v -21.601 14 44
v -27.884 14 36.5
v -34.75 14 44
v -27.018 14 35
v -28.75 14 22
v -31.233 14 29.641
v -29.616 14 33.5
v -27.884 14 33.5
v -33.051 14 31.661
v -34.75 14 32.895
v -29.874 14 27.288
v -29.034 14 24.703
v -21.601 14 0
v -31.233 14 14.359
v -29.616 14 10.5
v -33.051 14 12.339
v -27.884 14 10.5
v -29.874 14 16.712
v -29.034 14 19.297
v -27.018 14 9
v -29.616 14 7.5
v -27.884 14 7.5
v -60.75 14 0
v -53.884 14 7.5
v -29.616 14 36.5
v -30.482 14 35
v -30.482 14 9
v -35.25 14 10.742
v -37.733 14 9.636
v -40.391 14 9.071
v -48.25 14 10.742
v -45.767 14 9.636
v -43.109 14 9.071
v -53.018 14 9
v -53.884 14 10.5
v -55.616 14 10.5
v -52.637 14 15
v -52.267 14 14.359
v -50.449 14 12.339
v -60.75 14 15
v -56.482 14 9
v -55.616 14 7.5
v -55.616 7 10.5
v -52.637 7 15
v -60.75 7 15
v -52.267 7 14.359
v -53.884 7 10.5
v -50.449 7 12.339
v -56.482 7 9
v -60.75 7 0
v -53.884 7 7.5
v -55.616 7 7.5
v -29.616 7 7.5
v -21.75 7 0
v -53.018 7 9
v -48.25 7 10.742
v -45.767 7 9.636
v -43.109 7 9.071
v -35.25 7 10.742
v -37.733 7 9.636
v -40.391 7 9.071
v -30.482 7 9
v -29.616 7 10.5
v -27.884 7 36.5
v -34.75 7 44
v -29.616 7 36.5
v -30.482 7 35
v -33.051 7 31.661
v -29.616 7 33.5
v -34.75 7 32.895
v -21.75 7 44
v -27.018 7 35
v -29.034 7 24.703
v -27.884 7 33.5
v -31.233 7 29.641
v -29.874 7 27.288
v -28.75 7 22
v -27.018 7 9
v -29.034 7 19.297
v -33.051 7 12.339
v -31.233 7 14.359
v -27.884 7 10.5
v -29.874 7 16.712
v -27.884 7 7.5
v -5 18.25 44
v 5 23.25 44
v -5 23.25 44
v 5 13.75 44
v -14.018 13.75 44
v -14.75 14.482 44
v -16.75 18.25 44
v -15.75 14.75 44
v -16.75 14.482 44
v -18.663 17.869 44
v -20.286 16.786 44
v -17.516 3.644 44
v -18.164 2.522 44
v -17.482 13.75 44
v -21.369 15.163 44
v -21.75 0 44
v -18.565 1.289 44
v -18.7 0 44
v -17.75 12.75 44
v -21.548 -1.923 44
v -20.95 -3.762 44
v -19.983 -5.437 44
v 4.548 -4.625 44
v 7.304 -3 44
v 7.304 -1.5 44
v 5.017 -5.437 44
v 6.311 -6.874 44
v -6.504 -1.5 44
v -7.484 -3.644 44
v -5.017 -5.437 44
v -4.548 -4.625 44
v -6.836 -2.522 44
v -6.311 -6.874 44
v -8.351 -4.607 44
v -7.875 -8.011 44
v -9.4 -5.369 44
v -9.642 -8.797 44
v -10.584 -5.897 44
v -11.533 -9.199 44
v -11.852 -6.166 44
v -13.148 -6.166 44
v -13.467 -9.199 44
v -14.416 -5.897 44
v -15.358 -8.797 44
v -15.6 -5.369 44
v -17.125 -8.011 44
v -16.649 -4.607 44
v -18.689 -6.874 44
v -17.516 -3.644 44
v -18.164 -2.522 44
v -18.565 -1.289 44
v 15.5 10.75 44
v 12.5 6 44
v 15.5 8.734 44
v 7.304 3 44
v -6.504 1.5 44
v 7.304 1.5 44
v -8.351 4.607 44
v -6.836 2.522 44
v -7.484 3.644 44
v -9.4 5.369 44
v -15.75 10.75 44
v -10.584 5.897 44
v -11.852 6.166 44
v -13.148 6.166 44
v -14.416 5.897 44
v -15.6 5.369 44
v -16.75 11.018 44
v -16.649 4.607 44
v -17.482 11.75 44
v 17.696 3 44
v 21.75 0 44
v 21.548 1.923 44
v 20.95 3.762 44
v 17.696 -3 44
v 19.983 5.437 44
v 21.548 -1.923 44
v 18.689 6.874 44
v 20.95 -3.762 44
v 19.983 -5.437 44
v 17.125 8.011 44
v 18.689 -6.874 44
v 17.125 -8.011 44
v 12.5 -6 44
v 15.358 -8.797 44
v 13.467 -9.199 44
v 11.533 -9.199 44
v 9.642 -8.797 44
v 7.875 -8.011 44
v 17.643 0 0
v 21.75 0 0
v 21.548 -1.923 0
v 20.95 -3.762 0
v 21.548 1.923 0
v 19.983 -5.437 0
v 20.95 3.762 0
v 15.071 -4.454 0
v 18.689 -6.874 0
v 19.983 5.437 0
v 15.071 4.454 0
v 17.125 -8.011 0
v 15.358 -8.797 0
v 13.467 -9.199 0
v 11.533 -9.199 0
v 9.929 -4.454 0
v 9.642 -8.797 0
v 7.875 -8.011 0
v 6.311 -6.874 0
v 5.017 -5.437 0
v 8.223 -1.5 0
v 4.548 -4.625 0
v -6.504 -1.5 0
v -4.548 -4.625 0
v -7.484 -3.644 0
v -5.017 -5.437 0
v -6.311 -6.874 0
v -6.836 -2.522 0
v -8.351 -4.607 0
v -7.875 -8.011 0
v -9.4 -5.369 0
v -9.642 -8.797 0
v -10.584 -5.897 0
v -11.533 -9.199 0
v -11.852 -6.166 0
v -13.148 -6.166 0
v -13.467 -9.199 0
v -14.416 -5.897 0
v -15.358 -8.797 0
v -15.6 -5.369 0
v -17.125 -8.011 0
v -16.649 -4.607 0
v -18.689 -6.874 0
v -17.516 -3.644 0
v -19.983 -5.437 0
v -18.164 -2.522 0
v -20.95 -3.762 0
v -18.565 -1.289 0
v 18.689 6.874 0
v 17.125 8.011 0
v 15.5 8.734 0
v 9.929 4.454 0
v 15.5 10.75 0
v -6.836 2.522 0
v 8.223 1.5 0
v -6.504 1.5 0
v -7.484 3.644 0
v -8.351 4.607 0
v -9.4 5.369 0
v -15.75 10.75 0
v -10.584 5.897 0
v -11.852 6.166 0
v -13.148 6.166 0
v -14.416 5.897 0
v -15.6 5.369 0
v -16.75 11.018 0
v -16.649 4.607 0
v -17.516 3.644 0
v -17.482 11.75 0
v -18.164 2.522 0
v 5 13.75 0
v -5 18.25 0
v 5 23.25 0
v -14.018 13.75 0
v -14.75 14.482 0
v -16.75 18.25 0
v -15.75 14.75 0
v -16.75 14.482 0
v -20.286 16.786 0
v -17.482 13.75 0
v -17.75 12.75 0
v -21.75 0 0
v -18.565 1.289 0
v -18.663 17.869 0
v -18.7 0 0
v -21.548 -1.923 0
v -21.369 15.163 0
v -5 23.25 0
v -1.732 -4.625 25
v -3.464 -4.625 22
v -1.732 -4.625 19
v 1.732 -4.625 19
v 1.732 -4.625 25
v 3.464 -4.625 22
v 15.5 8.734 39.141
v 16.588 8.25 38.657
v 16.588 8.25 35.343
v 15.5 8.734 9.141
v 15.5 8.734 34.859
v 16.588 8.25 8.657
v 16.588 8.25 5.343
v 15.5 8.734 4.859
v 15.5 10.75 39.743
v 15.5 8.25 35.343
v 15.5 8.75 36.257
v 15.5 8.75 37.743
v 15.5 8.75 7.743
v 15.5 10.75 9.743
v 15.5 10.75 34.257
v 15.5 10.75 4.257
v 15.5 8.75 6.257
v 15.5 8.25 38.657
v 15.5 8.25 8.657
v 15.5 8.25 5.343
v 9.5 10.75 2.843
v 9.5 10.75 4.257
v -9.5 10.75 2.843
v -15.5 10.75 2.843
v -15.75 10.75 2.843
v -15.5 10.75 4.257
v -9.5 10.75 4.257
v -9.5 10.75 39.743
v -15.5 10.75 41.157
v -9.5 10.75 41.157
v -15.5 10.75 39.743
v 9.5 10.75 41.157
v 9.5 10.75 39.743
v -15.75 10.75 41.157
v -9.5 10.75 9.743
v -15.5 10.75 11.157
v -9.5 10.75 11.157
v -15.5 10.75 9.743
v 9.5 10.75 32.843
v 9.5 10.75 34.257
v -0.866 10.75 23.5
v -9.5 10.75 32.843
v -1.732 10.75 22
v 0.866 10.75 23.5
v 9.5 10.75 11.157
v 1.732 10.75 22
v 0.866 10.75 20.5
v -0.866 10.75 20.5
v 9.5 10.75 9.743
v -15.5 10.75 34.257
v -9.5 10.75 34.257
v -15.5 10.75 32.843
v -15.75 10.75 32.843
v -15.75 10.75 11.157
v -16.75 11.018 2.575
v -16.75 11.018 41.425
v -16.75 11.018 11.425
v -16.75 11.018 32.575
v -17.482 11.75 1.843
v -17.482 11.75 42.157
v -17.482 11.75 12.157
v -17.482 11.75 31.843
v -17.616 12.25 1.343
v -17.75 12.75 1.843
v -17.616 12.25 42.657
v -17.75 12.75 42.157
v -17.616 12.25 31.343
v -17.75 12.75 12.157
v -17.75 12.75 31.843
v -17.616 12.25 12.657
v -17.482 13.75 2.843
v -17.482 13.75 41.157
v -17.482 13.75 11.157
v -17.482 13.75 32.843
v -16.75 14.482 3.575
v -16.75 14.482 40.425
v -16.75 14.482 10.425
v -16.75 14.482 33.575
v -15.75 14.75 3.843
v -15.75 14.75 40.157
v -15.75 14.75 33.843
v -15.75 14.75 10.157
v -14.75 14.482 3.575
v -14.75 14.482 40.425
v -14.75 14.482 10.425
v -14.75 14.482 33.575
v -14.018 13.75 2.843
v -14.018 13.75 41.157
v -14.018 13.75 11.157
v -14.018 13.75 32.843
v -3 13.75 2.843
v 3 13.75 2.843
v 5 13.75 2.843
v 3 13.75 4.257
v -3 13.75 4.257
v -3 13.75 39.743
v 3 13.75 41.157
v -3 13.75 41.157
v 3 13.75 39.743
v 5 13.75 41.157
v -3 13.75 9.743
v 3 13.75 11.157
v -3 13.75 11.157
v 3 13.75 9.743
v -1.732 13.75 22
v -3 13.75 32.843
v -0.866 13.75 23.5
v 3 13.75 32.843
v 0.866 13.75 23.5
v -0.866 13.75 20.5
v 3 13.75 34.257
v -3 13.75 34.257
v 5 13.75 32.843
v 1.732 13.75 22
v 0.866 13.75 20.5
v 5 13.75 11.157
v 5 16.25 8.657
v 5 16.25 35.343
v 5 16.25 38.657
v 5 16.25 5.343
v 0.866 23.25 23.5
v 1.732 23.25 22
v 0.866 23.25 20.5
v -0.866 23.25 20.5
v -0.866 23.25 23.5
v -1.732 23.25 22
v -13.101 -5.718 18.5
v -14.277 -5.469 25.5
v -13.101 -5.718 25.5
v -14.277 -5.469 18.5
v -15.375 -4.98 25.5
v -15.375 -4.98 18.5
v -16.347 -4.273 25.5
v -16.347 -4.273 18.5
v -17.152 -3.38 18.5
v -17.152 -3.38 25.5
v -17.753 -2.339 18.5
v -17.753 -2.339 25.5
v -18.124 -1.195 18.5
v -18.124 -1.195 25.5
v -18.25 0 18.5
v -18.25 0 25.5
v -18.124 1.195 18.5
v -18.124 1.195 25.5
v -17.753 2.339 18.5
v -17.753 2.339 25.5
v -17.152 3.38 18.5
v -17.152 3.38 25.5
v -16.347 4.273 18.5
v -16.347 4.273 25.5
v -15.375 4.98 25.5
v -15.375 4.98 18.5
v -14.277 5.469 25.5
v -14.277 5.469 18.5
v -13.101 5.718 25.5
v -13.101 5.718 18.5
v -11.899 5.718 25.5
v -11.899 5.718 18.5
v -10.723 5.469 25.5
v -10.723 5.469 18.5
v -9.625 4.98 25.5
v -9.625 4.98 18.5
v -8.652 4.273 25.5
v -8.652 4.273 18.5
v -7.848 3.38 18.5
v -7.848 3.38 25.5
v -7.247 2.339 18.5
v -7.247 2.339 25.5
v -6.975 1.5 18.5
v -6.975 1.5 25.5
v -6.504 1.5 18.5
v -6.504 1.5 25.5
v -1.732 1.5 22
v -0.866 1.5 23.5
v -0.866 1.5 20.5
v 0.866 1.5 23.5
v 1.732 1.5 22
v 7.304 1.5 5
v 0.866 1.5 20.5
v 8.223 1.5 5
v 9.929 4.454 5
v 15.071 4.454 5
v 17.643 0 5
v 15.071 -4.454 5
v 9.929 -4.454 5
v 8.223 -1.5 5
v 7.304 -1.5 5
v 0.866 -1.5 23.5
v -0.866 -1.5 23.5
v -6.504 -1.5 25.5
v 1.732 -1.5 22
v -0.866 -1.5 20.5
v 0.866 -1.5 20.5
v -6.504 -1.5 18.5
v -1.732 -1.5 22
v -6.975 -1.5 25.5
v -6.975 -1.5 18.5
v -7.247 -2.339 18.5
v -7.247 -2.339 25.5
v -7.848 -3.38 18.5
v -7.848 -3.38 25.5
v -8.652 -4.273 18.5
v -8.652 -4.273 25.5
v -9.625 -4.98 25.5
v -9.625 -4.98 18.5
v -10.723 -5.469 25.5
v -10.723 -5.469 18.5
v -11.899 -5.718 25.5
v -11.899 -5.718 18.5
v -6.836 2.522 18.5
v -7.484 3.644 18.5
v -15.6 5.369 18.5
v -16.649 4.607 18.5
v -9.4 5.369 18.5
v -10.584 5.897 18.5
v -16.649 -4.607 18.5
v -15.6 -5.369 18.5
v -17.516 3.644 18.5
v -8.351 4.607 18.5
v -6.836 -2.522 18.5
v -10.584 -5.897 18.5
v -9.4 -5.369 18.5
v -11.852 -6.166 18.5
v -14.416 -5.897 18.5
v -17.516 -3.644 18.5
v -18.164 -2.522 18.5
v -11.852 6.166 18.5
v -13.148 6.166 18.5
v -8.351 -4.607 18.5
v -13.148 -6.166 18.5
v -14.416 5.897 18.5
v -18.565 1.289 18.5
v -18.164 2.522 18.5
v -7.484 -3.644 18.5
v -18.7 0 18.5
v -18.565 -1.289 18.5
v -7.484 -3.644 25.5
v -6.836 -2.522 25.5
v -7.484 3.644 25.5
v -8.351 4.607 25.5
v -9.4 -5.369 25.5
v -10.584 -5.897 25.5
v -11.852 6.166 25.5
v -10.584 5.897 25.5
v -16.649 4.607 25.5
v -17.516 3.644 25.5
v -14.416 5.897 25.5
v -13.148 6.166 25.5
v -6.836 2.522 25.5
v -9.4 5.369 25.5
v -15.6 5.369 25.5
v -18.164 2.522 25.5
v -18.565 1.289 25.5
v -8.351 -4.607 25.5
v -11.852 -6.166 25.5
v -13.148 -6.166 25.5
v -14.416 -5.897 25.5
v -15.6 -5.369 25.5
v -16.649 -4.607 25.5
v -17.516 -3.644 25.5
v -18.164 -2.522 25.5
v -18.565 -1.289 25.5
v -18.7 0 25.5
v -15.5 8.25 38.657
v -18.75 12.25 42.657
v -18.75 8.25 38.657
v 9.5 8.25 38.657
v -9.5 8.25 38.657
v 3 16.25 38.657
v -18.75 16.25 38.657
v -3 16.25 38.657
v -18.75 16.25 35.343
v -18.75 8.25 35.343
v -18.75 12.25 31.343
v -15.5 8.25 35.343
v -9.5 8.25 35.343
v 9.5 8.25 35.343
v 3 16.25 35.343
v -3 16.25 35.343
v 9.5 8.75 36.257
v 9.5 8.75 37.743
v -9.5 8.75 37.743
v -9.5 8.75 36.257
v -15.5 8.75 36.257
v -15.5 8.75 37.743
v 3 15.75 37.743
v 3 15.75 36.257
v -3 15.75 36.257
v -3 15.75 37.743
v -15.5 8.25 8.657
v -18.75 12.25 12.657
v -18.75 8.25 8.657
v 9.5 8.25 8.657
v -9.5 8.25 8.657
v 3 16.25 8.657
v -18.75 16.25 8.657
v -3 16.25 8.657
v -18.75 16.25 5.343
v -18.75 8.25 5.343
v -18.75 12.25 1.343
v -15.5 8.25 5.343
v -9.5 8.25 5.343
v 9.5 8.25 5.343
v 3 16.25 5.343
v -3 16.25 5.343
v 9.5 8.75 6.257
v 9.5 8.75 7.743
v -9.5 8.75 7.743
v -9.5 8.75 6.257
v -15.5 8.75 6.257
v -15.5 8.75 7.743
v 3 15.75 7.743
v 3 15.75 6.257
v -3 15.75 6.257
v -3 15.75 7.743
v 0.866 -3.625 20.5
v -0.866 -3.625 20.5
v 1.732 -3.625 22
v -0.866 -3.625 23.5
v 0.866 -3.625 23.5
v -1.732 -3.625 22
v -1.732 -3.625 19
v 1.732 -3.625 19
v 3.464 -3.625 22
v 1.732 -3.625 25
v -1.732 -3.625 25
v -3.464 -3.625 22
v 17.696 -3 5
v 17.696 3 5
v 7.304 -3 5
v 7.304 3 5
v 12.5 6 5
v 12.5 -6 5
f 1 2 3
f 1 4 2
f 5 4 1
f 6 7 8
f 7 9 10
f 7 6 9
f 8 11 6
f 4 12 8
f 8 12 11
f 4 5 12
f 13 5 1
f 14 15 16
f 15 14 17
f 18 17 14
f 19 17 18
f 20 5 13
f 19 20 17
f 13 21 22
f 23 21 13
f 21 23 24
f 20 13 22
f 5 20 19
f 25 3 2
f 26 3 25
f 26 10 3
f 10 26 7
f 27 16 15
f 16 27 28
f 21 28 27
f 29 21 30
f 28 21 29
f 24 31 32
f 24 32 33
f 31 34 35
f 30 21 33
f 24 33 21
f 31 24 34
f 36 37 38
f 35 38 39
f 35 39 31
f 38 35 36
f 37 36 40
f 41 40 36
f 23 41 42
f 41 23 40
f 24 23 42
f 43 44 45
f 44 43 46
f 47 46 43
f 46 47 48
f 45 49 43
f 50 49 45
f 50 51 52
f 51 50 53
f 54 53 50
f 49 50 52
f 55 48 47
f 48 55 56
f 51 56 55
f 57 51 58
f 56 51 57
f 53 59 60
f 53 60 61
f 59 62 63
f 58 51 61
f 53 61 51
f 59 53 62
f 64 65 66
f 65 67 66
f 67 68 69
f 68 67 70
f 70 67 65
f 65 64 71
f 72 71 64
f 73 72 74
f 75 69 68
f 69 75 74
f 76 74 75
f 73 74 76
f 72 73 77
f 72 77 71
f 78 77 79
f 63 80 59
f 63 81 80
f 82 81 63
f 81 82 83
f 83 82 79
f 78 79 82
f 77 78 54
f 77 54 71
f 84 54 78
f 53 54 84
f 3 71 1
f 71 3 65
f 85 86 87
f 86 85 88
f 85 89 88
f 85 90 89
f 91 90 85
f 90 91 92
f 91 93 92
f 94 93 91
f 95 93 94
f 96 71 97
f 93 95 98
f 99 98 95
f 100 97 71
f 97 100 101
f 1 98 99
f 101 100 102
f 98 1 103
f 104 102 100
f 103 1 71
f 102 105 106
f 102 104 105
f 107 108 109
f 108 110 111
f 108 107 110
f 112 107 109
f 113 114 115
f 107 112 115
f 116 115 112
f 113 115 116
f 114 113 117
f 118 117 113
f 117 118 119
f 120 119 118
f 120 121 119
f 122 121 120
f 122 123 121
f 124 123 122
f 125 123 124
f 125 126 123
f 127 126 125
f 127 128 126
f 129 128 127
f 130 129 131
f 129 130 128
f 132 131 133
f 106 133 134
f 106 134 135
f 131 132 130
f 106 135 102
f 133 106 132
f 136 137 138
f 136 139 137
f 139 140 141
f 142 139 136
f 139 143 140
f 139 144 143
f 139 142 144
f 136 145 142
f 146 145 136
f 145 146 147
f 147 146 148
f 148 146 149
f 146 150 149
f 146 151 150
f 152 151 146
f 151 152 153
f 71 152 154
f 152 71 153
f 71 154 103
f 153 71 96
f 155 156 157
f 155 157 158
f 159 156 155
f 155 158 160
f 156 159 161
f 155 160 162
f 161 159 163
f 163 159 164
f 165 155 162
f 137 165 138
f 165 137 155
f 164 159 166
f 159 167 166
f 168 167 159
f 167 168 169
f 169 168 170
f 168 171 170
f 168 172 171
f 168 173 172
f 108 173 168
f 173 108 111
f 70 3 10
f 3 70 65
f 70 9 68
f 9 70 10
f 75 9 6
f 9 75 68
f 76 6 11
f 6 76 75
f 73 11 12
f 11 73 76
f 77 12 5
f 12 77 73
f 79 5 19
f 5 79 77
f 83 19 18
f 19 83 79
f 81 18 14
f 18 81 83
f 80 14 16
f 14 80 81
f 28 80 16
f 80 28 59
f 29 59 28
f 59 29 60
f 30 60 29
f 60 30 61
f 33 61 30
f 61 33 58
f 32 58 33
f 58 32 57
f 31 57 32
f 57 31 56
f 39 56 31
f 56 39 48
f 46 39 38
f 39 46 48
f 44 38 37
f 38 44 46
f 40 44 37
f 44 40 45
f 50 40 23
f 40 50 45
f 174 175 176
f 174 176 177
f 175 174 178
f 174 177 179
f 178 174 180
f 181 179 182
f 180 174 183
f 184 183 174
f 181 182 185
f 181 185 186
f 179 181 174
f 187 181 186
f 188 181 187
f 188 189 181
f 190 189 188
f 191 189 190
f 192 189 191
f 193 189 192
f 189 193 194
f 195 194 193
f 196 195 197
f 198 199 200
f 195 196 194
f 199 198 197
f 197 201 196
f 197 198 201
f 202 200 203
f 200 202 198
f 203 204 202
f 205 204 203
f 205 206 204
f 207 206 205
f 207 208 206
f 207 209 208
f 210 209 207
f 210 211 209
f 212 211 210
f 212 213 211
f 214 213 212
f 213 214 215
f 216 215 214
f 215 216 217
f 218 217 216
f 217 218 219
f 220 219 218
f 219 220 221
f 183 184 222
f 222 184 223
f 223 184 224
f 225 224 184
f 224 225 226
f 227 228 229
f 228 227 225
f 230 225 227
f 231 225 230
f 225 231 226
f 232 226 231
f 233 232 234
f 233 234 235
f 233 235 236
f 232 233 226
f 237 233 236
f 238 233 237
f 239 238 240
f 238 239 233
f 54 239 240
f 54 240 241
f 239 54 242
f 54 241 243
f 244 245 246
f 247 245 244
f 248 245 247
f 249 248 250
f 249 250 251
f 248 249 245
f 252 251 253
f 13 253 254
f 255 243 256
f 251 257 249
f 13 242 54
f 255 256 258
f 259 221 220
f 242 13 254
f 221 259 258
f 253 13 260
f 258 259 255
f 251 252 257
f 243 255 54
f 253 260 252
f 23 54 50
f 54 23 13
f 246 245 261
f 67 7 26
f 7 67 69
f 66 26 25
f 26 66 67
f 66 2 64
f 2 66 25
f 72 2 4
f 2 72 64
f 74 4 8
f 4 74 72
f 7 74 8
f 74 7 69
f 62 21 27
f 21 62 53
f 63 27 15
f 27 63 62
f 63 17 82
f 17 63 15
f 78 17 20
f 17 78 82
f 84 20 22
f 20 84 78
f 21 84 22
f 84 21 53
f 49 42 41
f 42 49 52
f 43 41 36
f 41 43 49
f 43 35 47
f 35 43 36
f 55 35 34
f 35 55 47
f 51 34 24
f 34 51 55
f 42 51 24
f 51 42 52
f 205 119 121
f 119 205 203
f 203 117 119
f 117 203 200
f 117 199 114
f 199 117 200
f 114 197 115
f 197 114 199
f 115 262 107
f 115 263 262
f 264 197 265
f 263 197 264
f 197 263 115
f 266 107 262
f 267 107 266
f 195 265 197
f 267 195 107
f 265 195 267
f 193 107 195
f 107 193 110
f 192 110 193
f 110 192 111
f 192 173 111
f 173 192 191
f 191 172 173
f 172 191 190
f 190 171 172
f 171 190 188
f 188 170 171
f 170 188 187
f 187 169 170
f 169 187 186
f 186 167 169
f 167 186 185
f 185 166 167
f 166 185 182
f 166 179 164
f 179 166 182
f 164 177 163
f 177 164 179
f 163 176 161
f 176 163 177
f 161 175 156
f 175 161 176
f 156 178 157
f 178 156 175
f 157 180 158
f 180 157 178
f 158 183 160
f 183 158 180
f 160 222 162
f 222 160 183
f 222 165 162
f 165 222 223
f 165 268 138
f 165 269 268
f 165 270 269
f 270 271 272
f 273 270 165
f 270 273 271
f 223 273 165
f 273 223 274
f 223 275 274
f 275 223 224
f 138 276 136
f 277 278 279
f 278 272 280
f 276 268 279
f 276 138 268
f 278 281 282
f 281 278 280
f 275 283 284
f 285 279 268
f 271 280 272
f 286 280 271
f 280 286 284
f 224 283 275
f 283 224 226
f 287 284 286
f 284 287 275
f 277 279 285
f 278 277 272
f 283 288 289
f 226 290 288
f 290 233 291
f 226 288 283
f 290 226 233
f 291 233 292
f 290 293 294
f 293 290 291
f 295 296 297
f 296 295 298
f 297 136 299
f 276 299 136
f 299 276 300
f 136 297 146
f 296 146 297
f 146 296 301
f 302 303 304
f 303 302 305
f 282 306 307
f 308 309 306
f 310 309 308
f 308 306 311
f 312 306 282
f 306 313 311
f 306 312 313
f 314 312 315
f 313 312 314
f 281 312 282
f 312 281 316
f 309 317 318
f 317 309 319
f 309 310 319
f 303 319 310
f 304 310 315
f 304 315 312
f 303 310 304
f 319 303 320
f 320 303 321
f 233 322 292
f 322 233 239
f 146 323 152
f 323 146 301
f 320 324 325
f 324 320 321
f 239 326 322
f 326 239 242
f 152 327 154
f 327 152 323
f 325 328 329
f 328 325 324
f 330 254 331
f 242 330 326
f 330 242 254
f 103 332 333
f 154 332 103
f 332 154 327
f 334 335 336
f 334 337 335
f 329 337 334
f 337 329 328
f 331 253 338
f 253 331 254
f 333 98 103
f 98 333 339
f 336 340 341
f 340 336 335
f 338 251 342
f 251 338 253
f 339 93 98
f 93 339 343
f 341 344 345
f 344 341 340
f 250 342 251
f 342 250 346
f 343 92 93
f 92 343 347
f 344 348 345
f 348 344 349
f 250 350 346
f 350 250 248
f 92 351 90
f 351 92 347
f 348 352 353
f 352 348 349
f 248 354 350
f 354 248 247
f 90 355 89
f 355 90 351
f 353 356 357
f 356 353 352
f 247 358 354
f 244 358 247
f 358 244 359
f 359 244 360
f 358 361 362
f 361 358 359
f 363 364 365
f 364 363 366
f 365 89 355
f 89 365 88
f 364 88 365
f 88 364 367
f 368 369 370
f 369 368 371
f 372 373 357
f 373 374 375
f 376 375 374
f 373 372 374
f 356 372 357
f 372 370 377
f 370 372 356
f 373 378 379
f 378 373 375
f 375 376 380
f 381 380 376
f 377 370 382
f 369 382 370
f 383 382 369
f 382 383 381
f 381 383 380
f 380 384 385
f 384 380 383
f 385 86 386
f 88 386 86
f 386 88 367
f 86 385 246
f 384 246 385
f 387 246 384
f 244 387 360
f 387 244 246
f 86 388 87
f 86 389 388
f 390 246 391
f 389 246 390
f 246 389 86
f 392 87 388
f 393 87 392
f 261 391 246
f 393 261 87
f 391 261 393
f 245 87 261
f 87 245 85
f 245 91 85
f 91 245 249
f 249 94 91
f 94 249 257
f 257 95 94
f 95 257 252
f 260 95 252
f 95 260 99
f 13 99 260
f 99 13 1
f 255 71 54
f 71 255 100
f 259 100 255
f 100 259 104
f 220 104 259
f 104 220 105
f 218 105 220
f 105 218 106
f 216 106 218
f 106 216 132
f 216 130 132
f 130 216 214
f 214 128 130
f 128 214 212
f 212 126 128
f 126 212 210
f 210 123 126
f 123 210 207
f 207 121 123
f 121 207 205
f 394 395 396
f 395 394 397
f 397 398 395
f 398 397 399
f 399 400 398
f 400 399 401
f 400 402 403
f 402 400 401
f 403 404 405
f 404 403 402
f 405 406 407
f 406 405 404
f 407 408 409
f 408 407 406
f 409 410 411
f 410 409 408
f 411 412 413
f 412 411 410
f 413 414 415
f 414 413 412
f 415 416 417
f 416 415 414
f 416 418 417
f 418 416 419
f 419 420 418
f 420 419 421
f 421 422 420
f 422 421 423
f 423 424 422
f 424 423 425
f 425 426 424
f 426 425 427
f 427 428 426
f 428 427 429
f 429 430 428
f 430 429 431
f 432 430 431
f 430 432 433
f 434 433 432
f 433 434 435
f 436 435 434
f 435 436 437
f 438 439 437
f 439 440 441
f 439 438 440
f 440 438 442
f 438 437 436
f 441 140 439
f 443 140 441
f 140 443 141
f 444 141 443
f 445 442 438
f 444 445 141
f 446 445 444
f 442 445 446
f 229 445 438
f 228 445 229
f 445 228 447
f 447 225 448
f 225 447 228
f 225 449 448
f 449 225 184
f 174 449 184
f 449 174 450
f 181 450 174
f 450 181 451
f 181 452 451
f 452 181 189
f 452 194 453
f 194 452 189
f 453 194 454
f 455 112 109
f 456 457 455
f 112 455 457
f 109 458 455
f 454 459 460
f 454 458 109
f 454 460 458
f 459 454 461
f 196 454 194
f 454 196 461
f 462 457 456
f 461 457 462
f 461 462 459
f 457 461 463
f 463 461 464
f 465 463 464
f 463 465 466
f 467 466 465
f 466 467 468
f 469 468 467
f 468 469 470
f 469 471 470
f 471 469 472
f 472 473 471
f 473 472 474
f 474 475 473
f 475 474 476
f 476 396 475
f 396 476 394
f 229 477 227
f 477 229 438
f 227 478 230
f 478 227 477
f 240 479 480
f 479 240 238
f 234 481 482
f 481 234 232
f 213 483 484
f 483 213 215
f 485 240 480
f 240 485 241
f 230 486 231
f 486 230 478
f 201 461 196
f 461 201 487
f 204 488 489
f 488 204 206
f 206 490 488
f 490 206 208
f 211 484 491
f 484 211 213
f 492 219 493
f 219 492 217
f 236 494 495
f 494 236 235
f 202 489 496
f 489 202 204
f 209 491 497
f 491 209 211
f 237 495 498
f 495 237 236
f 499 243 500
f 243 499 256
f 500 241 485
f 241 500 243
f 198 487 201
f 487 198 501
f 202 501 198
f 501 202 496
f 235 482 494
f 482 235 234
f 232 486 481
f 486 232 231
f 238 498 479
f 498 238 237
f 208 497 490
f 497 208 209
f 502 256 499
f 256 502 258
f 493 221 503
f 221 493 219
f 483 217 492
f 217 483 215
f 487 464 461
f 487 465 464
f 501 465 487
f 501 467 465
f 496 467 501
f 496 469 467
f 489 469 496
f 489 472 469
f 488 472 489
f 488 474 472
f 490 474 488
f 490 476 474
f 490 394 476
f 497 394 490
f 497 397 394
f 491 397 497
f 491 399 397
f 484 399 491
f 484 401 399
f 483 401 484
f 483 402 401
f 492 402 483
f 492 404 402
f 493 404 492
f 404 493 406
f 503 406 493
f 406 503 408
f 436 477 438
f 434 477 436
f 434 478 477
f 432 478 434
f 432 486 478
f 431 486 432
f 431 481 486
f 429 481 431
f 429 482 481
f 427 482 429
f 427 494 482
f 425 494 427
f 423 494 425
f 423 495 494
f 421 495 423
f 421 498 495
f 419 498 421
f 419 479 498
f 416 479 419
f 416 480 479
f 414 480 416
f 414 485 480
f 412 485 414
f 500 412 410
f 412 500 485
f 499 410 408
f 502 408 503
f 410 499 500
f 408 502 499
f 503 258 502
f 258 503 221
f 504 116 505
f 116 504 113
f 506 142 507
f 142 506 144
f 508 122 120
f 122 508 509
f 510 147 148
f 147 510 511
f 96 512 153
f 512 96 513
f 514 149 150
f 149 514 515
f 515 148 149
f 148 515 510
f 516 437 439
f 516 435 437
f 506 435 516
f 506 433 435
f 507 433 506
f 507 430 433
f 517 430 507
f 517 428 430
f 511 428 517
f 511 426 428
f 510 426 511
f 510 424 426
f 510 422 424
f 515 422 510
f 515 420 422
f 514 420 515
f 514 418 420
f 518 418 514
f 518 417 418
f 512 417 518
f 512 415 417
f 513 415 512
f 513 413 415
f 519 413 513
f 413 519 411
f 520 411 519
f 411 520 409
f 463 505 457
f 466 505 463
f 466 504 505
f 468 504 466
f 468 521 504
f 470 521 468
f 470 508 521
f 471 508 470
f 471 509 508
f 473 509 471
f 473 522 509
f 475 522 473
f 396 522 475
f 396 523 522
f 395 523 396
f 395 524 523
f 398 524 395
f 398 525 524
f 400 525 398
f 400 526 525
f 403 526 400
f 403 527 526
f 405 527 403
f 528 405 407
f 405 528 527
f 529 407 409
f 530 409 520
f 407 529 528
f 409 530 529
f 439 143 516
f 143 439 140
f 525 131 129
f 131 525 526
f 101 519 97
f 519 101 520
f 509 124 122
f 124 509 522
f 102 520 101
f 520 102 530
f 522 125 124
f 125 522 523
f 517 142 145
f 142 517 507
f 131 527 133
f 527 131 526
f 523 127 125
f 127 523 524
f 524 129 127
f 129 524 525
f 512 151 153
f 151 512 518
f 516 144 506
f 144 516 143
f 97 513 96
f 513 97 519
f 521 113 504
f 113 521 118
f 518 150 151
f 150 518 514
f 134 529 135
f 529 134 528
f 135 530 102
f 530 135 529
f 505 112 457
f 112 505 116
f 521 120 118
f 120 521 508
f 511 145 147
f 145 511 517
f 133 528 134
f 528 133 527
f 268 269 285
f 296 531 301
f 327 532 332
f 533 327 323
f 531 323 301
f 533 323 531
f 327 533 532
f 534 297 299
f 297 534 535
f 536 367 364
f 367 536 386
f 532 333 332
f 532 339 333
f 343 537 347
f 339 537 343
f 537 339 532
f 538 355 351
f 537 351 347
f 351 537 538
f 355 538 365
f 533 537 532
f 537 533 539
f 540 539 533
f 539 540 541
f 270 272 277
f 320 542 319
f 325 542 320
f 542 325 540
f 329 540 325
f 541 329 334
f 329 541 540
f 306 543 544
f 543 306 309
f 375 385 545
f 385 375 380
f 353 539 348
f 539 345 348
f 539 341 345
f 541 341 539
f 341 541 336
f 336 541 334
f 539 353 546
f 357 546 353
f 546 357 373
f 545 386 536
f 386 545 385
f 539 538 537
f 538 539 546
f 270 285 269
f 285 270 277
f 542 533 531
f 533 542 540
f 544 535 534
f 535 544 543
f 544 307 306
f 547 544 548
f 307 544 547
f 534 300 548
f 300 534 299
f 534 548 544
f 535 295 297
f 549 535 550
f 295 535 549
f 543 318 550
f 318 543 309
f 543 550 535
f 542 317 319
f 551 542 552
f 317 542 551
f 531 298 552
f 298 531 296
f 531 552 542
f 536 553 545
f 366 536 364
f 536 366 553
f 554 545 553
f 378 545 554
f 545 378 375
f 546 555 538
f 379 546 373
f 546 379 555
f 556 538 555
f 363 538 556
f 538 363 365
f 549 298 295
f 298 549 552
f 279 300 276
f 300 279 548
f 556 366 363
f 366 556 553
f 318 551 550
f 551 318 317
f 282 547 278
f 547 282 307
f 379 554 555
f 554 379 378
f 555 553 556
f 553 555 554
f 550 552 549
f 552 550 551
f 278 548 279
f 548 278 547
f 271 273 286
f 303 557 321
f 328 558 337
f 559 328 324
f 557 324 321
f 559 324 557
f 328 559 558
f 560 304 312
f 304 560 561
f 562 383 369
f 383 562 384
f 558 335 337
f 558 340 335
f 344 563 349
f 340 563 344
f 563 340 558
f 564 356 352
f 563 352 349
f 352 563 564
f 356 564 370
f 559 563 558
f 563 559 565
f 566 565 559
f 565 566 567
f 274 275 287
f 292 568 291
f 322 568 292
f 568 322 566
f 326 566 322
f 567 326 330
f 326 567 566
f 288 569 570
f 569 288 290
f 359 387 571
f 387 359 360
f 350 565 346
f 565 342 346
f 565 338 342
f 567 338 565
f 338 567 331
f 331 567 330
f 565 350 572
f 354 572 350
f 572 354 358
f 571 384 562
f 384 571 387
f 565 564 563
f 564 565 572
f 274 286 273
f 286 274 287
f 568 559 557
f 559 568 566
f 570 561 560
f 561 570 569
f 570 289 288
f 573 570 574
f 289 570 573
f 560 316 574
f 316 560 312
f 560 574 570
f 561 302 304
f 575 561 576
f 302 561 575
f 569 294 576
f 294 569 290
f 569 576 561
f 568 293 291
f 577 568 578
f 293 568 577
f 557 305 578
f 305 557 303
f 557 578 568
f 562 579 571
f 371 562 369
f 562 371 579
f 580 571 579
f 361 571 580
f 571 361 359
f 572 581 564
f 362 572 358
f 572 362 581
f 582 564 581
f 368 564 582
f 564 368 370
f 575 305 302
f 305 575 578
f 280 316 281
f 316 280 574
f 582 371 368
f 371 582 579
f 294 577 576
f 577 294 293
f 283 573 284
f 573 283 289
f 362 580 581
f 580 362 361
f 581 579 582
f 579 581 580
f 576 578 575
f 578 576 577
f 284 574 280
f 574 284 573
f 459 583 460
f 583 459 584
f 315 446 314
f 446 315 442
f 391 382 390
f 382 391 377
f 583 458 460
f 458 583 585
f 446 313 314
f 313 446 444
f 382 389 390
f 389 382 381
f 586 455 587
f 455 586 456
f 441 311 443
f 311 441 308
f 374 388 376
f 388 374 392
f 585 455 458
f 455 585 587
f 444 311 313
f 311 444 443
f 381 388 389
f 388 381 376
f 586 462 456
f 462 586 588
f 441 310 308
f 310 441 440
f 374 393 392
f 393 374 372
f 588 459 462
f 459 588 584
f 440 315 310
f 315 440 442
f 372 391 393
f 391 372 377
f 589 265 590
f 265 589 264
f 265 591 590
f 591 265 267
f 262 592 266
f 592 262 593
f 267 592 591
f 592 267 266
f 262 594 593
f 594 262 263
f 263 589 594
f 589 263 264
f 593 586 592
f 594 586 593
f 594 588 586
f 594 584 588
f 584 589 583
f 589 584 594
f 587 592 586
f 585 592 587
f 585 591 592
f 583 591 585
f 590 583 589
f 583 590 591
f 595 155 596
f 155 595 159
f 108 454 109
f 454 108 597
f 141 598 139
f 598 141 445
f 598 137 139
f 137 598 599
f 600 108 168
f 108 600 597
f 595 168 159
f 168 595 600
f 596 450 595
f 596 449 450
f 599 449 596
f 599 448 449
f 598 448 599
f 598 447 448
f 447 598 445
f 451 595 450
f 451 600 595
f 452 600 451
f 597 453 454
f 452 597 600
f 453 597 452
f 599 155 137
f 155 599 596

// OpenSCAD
rod_size = 6;
rod_nut_size = 12; //12 for M6, 15 for M8
bearing_size = 12.5; //12.5 for LM6UU, 15.5 for LM8UU,LM8SUU
bearing_length = 19.5; //19.5 for LM6UU, 17.5 for LM8SUU, 24.5 for LM8UU
yz_motor_distance = 25;
motor_screw_spacing = 26; //26 for NEMA14, 31 for NEMA17
motor_casing = 38; //38 for NEMA14, 45 for NEMA17
end_height = 40; //measure the height of your motor casing and add 4mm. Suggestion: 40 for NEMA14, 55 for NEMA17
bed_mount_height = 16;
//x_rod_spacing = motor_screw_spacing + 3 + rod_size;
x_rod_spacing = 30;
x_carriage_width = 35;
carriage_extruder_offset = 5;
pulley_size = 20;
idler_pulley_width = 10;
gusset_size = 15;
m3_size = 3;
m3_nut_size = 6;
m4_size = 4;
motor_shaft_size = 5;
outer_smooth=true;

// ratio for converting diameter to apothem
da6 = 1 / cos(180 / 6) / 2;
da8 = 1 / cos(180 / 8) / 2;

//Comment out all of the lines in the following section to render the assembled machine. Uncomment one of them to export that part for printing. You can also use the individual files to export each part.

//!base_end();
//!for(b = [0:1]) mirror([0, b, 0]) for(a = [-1,1]) translate([a * bearing_size / 4, bearing_size - (bearing_size * 2/3) * a, 0]) rotate(90 + 90 * a) y_bearing_retainer();
//!for(b = [0:1]) mirror([0, b, 0]) for(a = [-1,1]) translate([a * -7.5, 18 - 5 * a, 0]) rotate(180 + 90 * a) bed_mount();

//cylinder(h = 100, r = 3);
x_end(2);
%translate([-12.5,0,0]) cylinder(h=200, r=6.1,center=true, $fn=12);
%translate([12.5,0,0]) cylinder(h=200, r=6.1,center=true, $fn=12);
//!x_end(0);
//!x_carriage();
//!for(side = [-1,1]) translate([0, side * motor_screw_spacing / 2, 0]) leadscrew_coupler();
//!y_idler();
//!for(x = [1, -1]) for(y = [1, -1]) translate([x * (pulley_size / 2 + 3), y * (pulley_size / 2 + 3), 0]) idler_pulley(true);
//!for(x = [1, -1]) for(y = [1, -1]) translate([x * (rod_size * 1.5 + 2), y * (rod_size * 1.5 + 2), 0]) foot();
//!for(side = [0, 1]) mirror([side, 0, 0]) translate([-rod_size * 2.5, 0, 0]) z_top_clamp();


//The following section positions parts for rendering the assembled machine.
/*
	translate([0, 0, -bearing_size]) rotate([0, 180, 0]) base_end();
	for(end = [1, -1]) translate([0, end * motor_screw_spacing / 2 + 5, -bearing_size + bearing_size * sqrt(2) / 4]) rotate([-90, 0, 180]) y_bearing_retainer();
	for(side = [0, 1]) mirror([0, side, 0]) translate([yz_motor_distance / 2 - bearing_size / 2, -motor_casing / 2 - rod_size * 2 - 10, -bearing_size + bearing_size * sqrt(2) / 4]) rotate([90, 0, 0]) bed_mount();
	translate([-yz_motor_distance / 2 + rod_size - motor_casing / 4 - rod_size / 2, 0, 60 + (x_rod_spacing + 8 + rod_size) / 2]) rotate([0, 180, 0]) x_end(0);
	translate([140, 0, 60 + (x_rod_spacing + 8 + rod_size) / 2]) rotate([0, 180, 0]) {
		x_end(2);
		translate([0, 8 + rod_size, 0]) rotate([90, 0, 0]) translate([0, (x_rod_spacing + 8 + rod_size) / 2, rod_size / 2 - 2 - bearing_size / 2 - 4 - idler_pulley_width - 1.5]) idler_pulley(true);
	}
	translate([40, rod_size + bearing_size / 2 + 1 - rod_size / 2 + 2, 60]) {
		rotate([90, 0, 90]) x_carriage();
		translate([x_carriage_width / 2 + carriage_extruder_offset, -14 - bearing_size / 2 - 4, x_rod_spacing / 2 + bearing_size / 2 + 4]) {
			rotate([90, 0, 180]) translate([10.57, 30.3, -14]) import("gregs/gregs_accessible_wade-wildseyed_mount.stl", convexity = 5);
			%rotate(180 / 8) cylinder(r = 2, h = 150, center = true, $fn = 8);
		}
	}
	translate([-yz_motor_distance / 2 - motor_casing / 2, 0, -bearing_size / 2]) leadscrew_coupler();
	translate([60, 0, -bearing_size - rod_size / 2 - bearing_size / 2]) {
		rotate([0, 90, 0]) y_idler();
		for(side = [1, -1]) translate([5, side * (motor_casing / 2 - rod_size / 2), idler_pulley_width + 1.5 + rod_size]) rotate([180, 0, 0]) idler_pulley(true);
	}
	for(side = [0, 1]) mirror([0, side, 0]) translate([0, -motor_casing / 2 - rod_size * 2 - 10, -bearing_size - end_height + rod_size * 1.5]) rotate([90, 0, 0]) foot();
	translate([-yz_motor_distance / 2 + rod_size, 0, 210 - end_height]) rotate([180, 0, 90]) z_top_clamp(0);


*/



module z_top_clamp() difference() {
	union() {
		linear_extrude(height = rod_size * 2 + gusset_size, convexity = 5) difference() {
			union() {
				circle(r = rod_size * da6 * 2, $fn = 6);
				translate([0, -rod_size, 0]) square([rod_size * (1 + da6), rod_size * 2]);
				translate([rod_size - rod_size * da6, rod_size / 2, rod_size]) square([rod_size * da6 * 2, rod_size / 2 + gusset_size]);
			}
		}
		translate([rod_size, -rod_size - 1, rod_size]) rotate([-90, 0, 0]) cylinder(r = rod_size / cos(180 / 6), h = rod_size * 2 + gusset_size + 2, $fn = 6);
	}
	translate([rod_size, -rod_size - 2, rod_size]) rotate([-90, 0, 0]) cylinder(r = rod_size * da6, h = gusset_size + rod_size * 2 + 4, $fn = 6);
	translate([rod_size, rod_size + gusset_size, rod_size * 2 + gusset_size]) rotate([45, 0, 0]) cube([rod_size * 2, gusset_size * sqrt(2), gusset_size * sqrt(2)], center = true);
	translate([0, 0, -1]) linear_extrude(height = rod_size * 2 + gusset_size + 2, convexity = 5) {
		circle(r = rod_size * da6, $fn = 6);
		%translate([rod_size, -10, rod_size * da6 * 2]) rotate([-90, 0, 0]) cylinder(r = rod_size * da6, h = 160, $fn = 6);
		translate([0, -rod_size / 2, 0]) square([gusset_size + rod_size * 2 + 1, rod_size]);
	}
}

module foot() difference() {
	linear_extrude(height = rod_size, convexity = 5) difference() {
		minkowski() {
			square(rod_size + 2, center = true);
			circle(rod_size, $fn = 16);
		}
		circle(rod_size / 2, $fn = 12);
	}
	translate([0, 0, -rod_size / 16]) cylinder(r1 = rod_size * 3/4, r2 = rod_size / 4, h = rod_size / 2, $fn = 12);
	translate([0, 0, rod_size / 2 + rod_size / 16]) cylinder(r2 = rod_size * 3/4, r1 = rod_size / 4, h = rod_size / 2, $fn = 12);
}

module idler_pulley(double_bearing = true) difference() {
	intersection() {
		linear_extrude(height = idler_pulley_width + 1, convexity = 5) difference() {
			circle(pulley_size / 2 + 2);
			circle(5, $fn = 4);
		}
		union() {
			translate([0, 0, idler_pulley_width / 2 + 1]) scale([1, 1, 1.25]) sphere(pulley_size / 2);
			cylinder(r = pulley_size / 2 + 5, h = 1);
		}
	}
	for(h = [-idler_pulley_width + 4, idler_pulley_width * 2 + 1 - 4]) rotate(180 / 8) translate([0, 0, (double_bearing) ? h:0]) cylinder(r = 10 * da8, h = idler_pulley_width * 2, center = true, $fn = 8);
}

module y_idler() difference() {
	linear_extrude(height = 10, convexity = 5) difference() {
		union() {
			square([rod_size * 2, motor_casing + rod_size * 2], center = true);
			for(side = [1, -1]) translate([0, side * (motor_casing / 2 + rod_size), rod_size / 2 + bearing_size / 2]) rotate(180 / 8) circle(rod_size * 13/12, h = yz_motor_distance + motor_casing + 20, center = true, $fn = 8);
		}
		for(side = [1, -1]) translate([0, side * (motor_casing / 2 + rod_size), rod_size / 2 + bearing_size / 2]) rotate(180 / 8) circle(rod_size * da8, h = yz_motor_distance + motor_casing + 20, center = true, $fn = 8);

	}
	rotate([90, 0, 90]) {
		for(side = [1, -1]) translate([side * (motor_casing / 2 - rod_size / 2), 5, -3]) {
			cylinder(r = m3_size * da6, h = rod_size * 2, center = true, $fn = 6);
			translate([0, 0, rod_size]) cylinder(r = m3_nut_size * da6, h = 4, $fn = 6);
		}
		//belt
		%translate([0, 5, -rod_size - idler_pulley_width / 2]) linear_extrude(height = 5, center = true, convexity = 5) for(side = [1, 0]) mirror([side, 0, 0]) {
			translate([-(motor_casing / 2 - rod_size / 2), 0, 0]) {
				intersection() {
					difference() {
						circle(pulley_size / 2 + 2);
						circle(pulley_size / 2);
					}
					square(pulley_size);
				}
				rotate(90) difference() {
					translate([2, 0, 0]) square([pulley_size / 2, 40]);
					square([pulley_size / 2, 40]);
				}
				rotate(-90) difference() {
					translate([0, 2, 0]) square([60 - yz_motor_distance / 2 - motor_screw_spacing / 2, pulley_size / 2]);
					square([60, pulley_size / 2]);
				}
			}
			translate([0, -(60 - yz_motor_distance / 2 - motor_screw_spacing / 2), 0]) difference() {
				circle(motor_casing / 2 - rod_size / 2 - pulley_size / 2);
				circle(motor_casing / 2 - rod_size / 2 - pulley_size / 2 - 2);
				translate([-(motor_casing / 2 - rod_size / 2 - pulley_size / 2), 0, 0]) square(motor_casing - rod_size - pulley_size);
			}
		}
	}
}

module leadscrew_coupler() difference() {
	linear_extrude(height = 10 + rod_nut_size / 2 + 1, convexity = 5) difference() {
		circle(motor_screw_spacing / 2 - 1);
		circle(motor_shaft_size * da6, $fn = 6);
	}
	translate([0, 0, m3_nut_size / 2]) rotate([-90, 0, 90]) {
		cylinder(r = m3_size * da6, h = motor_screw_spacing / 2 + 1);
		%rotate(90) cylinder(r = m3_nut_size / 2, h = 5.5, $fn = 6);
		translate([0, 0, 12]) cylinder(r = m3_size * da6 * 2, h = motor_screw_spacing / 2);
		translate([-m3_nut_size / da6 / 4, -m3_nut_size / 2, 0]) cube([m3_nut_size / da6 / 2, m3_nut_size + 1, 5.7]);
	}
	translate([0, 0, 10]) cylinder(r = rod_nut_size / 2, h = rod_nut_size + 1, $fn = 6);
	//translate([0, 0, -1]) cube(100);
}

module x_carriage() difference() {
	intersection() {
		linear_extrude(height = x_carriage_width, convexity = 5) difference() {
			union() {
				square([bearing_size + 8, x_rod_spacing], center = true);
				translate([0, -x_rod_spacing / 2 - bearing_size / 2 - 4, 0]) square([bearing_size / 2 + 4 + 15, x_rod_spacing / 2 + bearing_size / 2 + 4 - 2 - pulley_size / 2]);
				translate([0, -pulley_size / 2, 0]) {
					square([bearing_size / 2 + 4 + 15, 8]);
					translate([bearing_size / 2 + 4 + 15, 4, 0]) circle(4);
				}
				rotate(180) translate([0, -x_rod_spacing / 2 - bearing_size / 2 - 4, 0]) square([bearing_size / 2 + 4 + 28, bearing_size / 2 + 4 + 3]);
				for(side = [1, -1]) translate([0, side * x_rod_spacing / 2, 0]) circle(bearing_size / 2 + 4, $fn = 30);
			}
			translate([bearing_size / 2 + 4, 2 - pulley_size / 2, 0]) {
				square([15, 4]);
				translate([0, -3, 0]) square([2, 4]);
				translate([15, 2, 0]) circle(2);
			}
			for(side = [1, -1]) translate([0, side * x_rod_spacing / 2, 0]) {
				circle(bearing_size / 2 -1, $fn = 30);
				rotate(90 * side) square([2, bearing_size / 2 + 40]);
			}
		}
		difference() {
			rotate([0, -90, 0]) linear_extrude(height = bearing_size + 100, convexity = 5, center = true) difference() {
				polygon([
					[
						0,
						(x_rod_spacing / 2 + bearing_size / 2 + 4)
					],[
						0,
						-(x_rod_spacing / 2 + bearing_size / 2 + 4)
					],[
						bearing_length + 4,
						-(x_rod_spacing / 2 + bearing_size / 2 + 4)
					],[
						bearing_length + 4,
						-(x_rod_spacing / 2 - bearing_size / 2 - 4)
					],[
						x_carriage_width,
						(x_rod_spacing / 2 - bearing_size / 2 - 4)
					],[
						x_carriage_width,
						(x_rod_spacing / 2 + bearing_size / 2 + 4)
					]
				]);
			}
			translate([bearing_size / 2 + 4, -50, bearing_length + 4]) cube(100);
		}
	}
	// linear bearings
	translate([0, x_rod_spacing / 2, 0]) rotate([0, 0, 0]) {
		%translate([0, 0, 20]) rotate(180 / 8) cylinder(r = rod_size * da8, h = 200, center = true, $fn = 8);
		for(end = [0, 1]) mirror([0, 0, end]) translate([0, 0, end * -x_carriage_width - 1]) cylinder(r = bearing_size / 2, h = bearing_length, $fn = 30);
	}
	translate([0, -x_rod_spacing / 2, 0]) rotate([0, 0, 0]) {
		translate([0, 0, 4]) cylinder(r = bearing_size / 2, h = x_carriage_width + 1, center = false, $fn = 30);
		%translate([0, 0,20]) rotate(180 / 8) cylinder(r = rod_size * da8, h = 200, center = true, $fn = 8);
	}
	// screw holes
	translate([bearing_size / 2 + 4 + 10, 5 - pulley_size / 2, bearing_length / 2 + 2]) rotate([90, 0, 0]) {
		cylinder(r = m3_size * da6, h = x_rod_spacing + bearing_size + 10, center = true, $fn = 6);
		rotate([180, 0, 0]) cylinder(r = m3_size * da6 * 2, h = x_rod_spacing + bearing_size + 10, center = false, $fn = 6);
		translate([0, 0, x_rod_spacing / 2 + bearing_size / 2 + 6 - pulley_size / 2]) cylinder(r = m3_nut_size * da6, h = x_rod_spacing + bearing_size + 10, center = false, $fn = 6);
	}
	//#for(side = [1, -1]) translate([-bearing_size / 2 - 4 - 14, 0, x_carriage_width / 2 + carriage_extruder_offset + side * 25]) rotate([90, 0, 0]) cylinder(r = 4.1, h = x_rod_spacing - 10, center = true, $fn = 6);
	translate([-bearing_size / 2 - 4 - 14, 0, x_carriage_width / 2 + carriage_extruder_offset]) rotate([90, 0, 0]) linear_extrude(height = bearing_size + x_rod_spacing + 10, center = true, convexity = 5) {
		*translate([-14, 0, 0]) {
			circle(20);
			rotate(45) square(5);
		}
		intersection() {
			translate([18, 0, 0]) rotate(135) square(100);
			translate([-14, 0, 0]) square([56, 100], center = true);
		}
		for(side = [1, -1]) translate([0, side * 25, 0]) circle(m4_size * da6, $fn = 6);
	}
}

module x_end(motor = 0) mirror([(motor == 0) ? 1 : 0, 0, 0]) difference() {
	union() {
		if(motor > 0) translate([-(motor_casing / 2 + rod_size + bearing_size + 8) / 2 - motor_casing, 8 + rod_size, 0]) rotate([90, 0, 0]) {
			// Motor holder
			linear_extrude(height = 7) difference() {
				square([motor_casing + 3, x_rod_spacing + 8 + rod_size]);
				translate([motor_casing / 2, (x_rod_spacing + 8 + rod_size) / 2, 0]) {
					circle(motor_screw_spacing / 2);
					for(x = [1, -1]) for(y = [1, -1]) translate([x * motor_screw_spacing / 2, y * motor_screw_spacing / 2, 0]) circle(m3_size * da6, $fn = 6);
					translate([-(motor_casing * 1.5 - motor_screw_spacing), (motor > 1) ? (motor_casing / 2 - motor_screw_spacing) : 0, 0]) square([motor_casing, x_rod_spacing + 8 + rod_size]);
				}
			}
			// Belt
			%translate([motor_casing / 2, (x_rod_spacing + 8 + rod_size) / 2, rod_size / 2 - 2 - bearing_size / 2 - 2 - idler_pulley_width / 2]) rotate([180, 0, 0]) linear_extrude(height = 5, convexity = 5) difference() {
				union() {
					circle(pulley_size / 2 + 2);
					translate([0, -pulley_size / 2 - 2, 0]) square([200.5, pulley_size + 4]);
					translate([200.5, 0, 0]) circle(pulley_size / 2 + 2);
				}
				circle(pulley_size / 2);
				translate([0, -pulley_size / 2, 0]) square([200.5, pulley_size]);
				translate([200.5, 0, 0]) circle(pulley_size / 2);
			}

		}
		linear_extrude(height = x_rod_spacing + 8 + rod_size, convexity = 5) difference() {
			union() {
				for(side = [1, -1]) translate([side * (motor_casing / 4 + rod_size / 2), 0, 0]) circle(bearing_size / 2 + 3, $fn = 30);
				square([motor_casing / 2 + rod_size, bearing_size / 2 + 3], center = true);
				translate([-(motor_casing / 2 + rod_size + bearing_size + 6) / 2, 0, 0]) square([(motor_casing / 2 + rod_size + bearing_size / 2 + 3 + 3) / 2, bearing_size / 2 + 4 + rod_size / 2]);
				translate([-(motor_casing / 2 + rod_size + bearing_size + 6) / 2, 0, 0]) square([motor_casing / 2 + rod_size + bearing_size / 2 + 3 + 3, bearing_size / 2 + 3 + rod_size / 2]);
				translate([-(motor_casing / 2 + rod_size + bearing_size + 6) / 2 + rod_size / 2 + 2, 0, 0]) square([(motor_casing / 2 + rod_size + bearing_size + 6) / 2 + 5 - rod_size / 2 - 2, bearing_size / 2 + 6 + rod_size]);
				translate([-(motor_casing / 2 + rod_size + bearing_size + 6) / 2 + rod_size / 2 + 2, bearing_size / 2 + rod_size / 2 + 4, 0]) circle(rod_size / 2 + 2);
				translate([0, bearing_size / 2 + rod_size + 6, 0]) square(10, center = true);
			}
			square([motor_casing / 2 + rod_size, 3], center = true);
			if(outer_smooth)
			{ translate([-(motor_casing / 4 + rod_size / 2), 0, 0]) circle(bearing_size / 2 - .5, $fn = 30);
			translate([(motor_casing / 4 + rod_size / 2), 0, 0]) circle(rod_nut_size * 6/14, $fn = 6);
			}
			else
			{translate([(motor_casing / 4 + rod_size / 2), 0, 0]) circle(bearing_size / 2 - .5, $fn = 30);
			translate([-(motor_casing / 4 + rod_size / 2), 0, 0]) circle(rod_nut_size * 6/14, $fn = 6);
			}
			
			translate([4 + rod_size / 2, bearing_size / 2 + rod_size / 2 + 3, 0]) {
				square([motor_casing / 2 + rod_size + bearing_size + 8, rod_size / 2], center = true);
				translate([-(motor_casing / 2 + rod_size + bearing_size + 8) / 2, .5, 0]) circle(rod_size / 4 + .5, $fn = 12);
			}
		}
	}
	if(outer_smooth)
	{
	translate([-(motor_casing / 2 + rod_size ), 0, (x_rod_spacing + rod_size + 8) / 2])  for(end = [0, 1]) mirror([0, 0, end]) translate([motor_casing / 4 + rod_size / 2, 0, -(x_rod_spacing + rod_size + 8) / 2 - 1]) cylinder(r = bearing_size / 2 - .05, h = bearing_length, $fn = 30);}

	translate([0, 0, (x_rod_spacing + rod_size + 8) / 2]) {
		if(!outer_smooth)
		{for(end = [0, 1]) mirror([0, 0, end]) translate([motor_casing / 4 + rod_size / 2, 0, -(x_rod_spacing + rod_size + 8) / 2 - 1]) cylinder(r = bearing_size / 2 - .05, h = bearing_length, $fn = 30);}
		for(side = [1, -1]) render(convexity = 5) translate([0, bearing_size / 2 + rod_size / 2 + 3, side * x_rod_spacing / 2]) rotate([0, 90, 0]) {
			//cylinder(r = rod_size / 2, h = motor_casing / 2 + rod_size + bearing_size + 10, center = true, $fn = 30);
			difference() {
				translate([0, 0, (motor > -1) ? rod_size / 2 + 2 : 0]) intersection() {
					rotate(45) cube([rod_size + 2, rod_size + 2, motor_casing / 2 + rod_size + bearing_size + 10], center = true);
					cube([rod_size * 2, rod_size + 2, motor_casing / 2 + rod_size + bearing_size + 10], center = true);
				}
				translate([0, rod_size, 0]) cube([rod_size * 2, rod_size * 2, 6], center = true);
				for(end = [1, -1]) translate([0, -rod_size, end * (motor_casing / 4 + rod_size / 2)]) cube([rod_size * 2, rod_size * 2, 6], center = true);
			}
			translate([0, 0, rod_size / 2 + 2]) intersection() {
				rotate(45) cube([rod_size, rod_size, motor_casing / 2 + rod_size + bearing_size + 10], center = true);
				cube([rod_size * 2, rod_size + 1, motor_casing / 2 + rod_size + bearing_size + 10], center = true);
			}
		}
		// holes for clamping screws
		rotate([90, 0, 0]) {
			cylinder(r = m3_size * da6, h = 100, center = true, $fn = 6);
			translate([0, 0, bearing_size / 4 + .5]) cylinder(r = m3_nut_size * da6, h = 100, center = false, $fn = 6);
		}
	}

	if(outer_smooth)
	{
		translate([(motor_casing / 4 + rod_size / 2), 0, 5]) rotate(90) cylinder(r = rod_nut_size / 2, h = x_rod_spacing + 8 + rod_size, $fn = 6);
		translate([-(motor_casing / 4 + rod_size / 2), 0, 5]) %rotate(180 / 8) cylinder(r = rod_size * da8, h = 200, center = true, $fn = 8);
	}
	else
	{
		translate([-(motor_casing / 4 + rod_size / 2), 0, 5]) rotate(90) cylinder(r = rod_nut_size / 2, h = x_rod_spacing + 8 + rod_size, $fn = 6);
		translate([(motor_casing / 4 + rod_size / 2), 0, 5]) %rotate(180 / 8) cylinder(r = rod_size * da8, h = 200, center = true, $fn = 8);
	}
}

module bed_mount() difference() {
	linear_extrude(height = 10, convexity = 5) difference() {
		union() {
			rotate(180 / 8) circle((rod_size + 8) * da8, $fn = 8);
			translate([0, -rod_size / 2 - 4, 0]) square([rod_size / 2 + 8, max(rod_size + 8, rod_size / 2 + 4 + bed_mount_height)]);
		}
		rotate(180 / 8) circle(rod_size * da8, $fn = 8);
		translate([0, -rod_size / (1 + sqrt(2)) / 2, 0]) square([rod_size + 10, rod_size / (1 + sqrt(2))]);
	}
	translate([rod_size / 2 + 1.5, -rod_size / 2 - 6, 5]) rotate([-90, 0, 0]) {
		cylinder(r = m3_size * da6, h = max(rod_size + 12, rod_size / 2 + 7 + bed_mount_height, $fn = 6));
		cylinder(r = m3_nut_size * da6, h = 4, $fn = 6);
	}
}

module y_bearing_retainer() intersection() {
	difference() {
		linear_extrude(height = 10, convexity = 5) difference() {
			union() {
				intersection() {
					translate([-yz_motor_distance / 2 + bearing_size / 2, 0, 0]) circle(bearing_size / 2 + 4);
					translate([-yz_motor_distance / 2 + bearing_size / 2 - bearing_size / 2 - 4, -bearing_size, 0]) square([bearing_size + 8, bearing_size]);
				}
				translate([-yz_motor_distance / 2 + bearing_size / 2 - bearing_size / 2 - 4, 0, 0]) square([bearing_size + 8, bearing_size * sqrt(2) / 4 - 1]);
				translate([0, bearing_size * sqrt(2) / 4 - 3, 0]) square([yz_motor_distance + motor_casing - motor_screw_spacing + 10, 4], center = true);
			}
			translate([-yz_motor_distance / 2 + bearing_size / 2, 0, 0]) circle(bearing_size / 2);
			translate([-yz_motor_distance / 2 + bearing_size / 2 - bearing_size / 2, 0, 0]) square(bearing_size);
		}
		//screw holes
		for(side = [1, -1]) translate([side * (yz_motor_distance + motor_casing - motor_screw_spacing) / 2, 0, 5]) rotate(90) rotate([90, 0, 90]) {
			cylinder(r = m3_size * da6, h = bearing_size, center = true, $fn = 6);
			translate([0, 0, bearing_size * sqrt(2) / 4 - 5]) rotate([180, 0, 0]) cylinder(r = m3_size, h = bearing_size, $fn = 30);
		}
	}
	translate([0, 0, 5]) rotate(90) rotate([90, 0, 90]) cylinder(r = (yz_motor_distance + motor_casing - motor_screw_spacing + 10) / 2, h = bearing_size + 10, center = true, $fn = 6);
}

module base_end() difference() {
	linear_extrude(height = end_height, convexity = 5) difference() {
		square([yz_motor_distance + motor_casing - motor_screw_spacing + 10, motor_casing + rod_size * 4], center = true);
		for(end = [1, -1]) {
			for(side = [1, -1]) translate([end * (yz_motor_distance + motor_casing - motor_screw_spacing) / 2, side * motor_screw_spacing / 2, 0]) circle(m3_size * da6, $fn = 6);
			translate([end * (yz_motor_distance + motor_casing) / 2, 0, 0]) circle(motor_screw_spacing / 2);
		}
	}
	for(end = [1, -1]) translate([end * (yz_motor_distance + motor_casing) / 2, 0, 3]) linear_extrude(height = end_height, convexity = 5) square(motor_casing, center = true);
	for(side = [1, -1]) translate([0, side * (motor_casing / 2 + rod_size), rod_size / 2 + bearing_size / 2]) rotate([90, 180 / 8, 90]) {
		cylinder(r = rod_size * da8, h = yz_motor_distance + motor_casing + 20, center = true, $fn = 8);
		%translate([0, 0, -70]) cylinder(r = rod_size * da8, h = 200, center = true, $fn = 8);
	}
	translate([0, 0, end_height]) scale([1, 1, .5]) rotate([90, 0, 90]) cylinder(r = motor_casing / 2, h = yz_motor_distance + 20, center = true);
	translate([yz_motor_distance / 2 - rod_size, 0, 0]) {
		translate([0, 0, -3]) linear_extrude(height = end_height - motor_casing / 4, convexity = 5) {
			rotate(180 / 8) circle(rod_size * da8, $fn = 8);
			translate([0, -rod_size / 4, 0]) square([rod_size * .6, rod_size / 2]);
		}
		// z axis clamping
		for(h = [8, end_height - motor_casing / 4 - 8]) translate([0, 0, h]) rotate([90, 0, 90]) {
			cylinder(r = m3_size * da6, h = yz_motor_distance + motor_casing, center = true, $fn = 6);
			translate([0, 0, -rod_size / 2 - 3]) cylinder(r = m3_nut_size* da6, h = yz_motor_distance + motor_casing, $fn = 6);
			translate([0, 0, 0]) cylinder(r = m3_nut_size / 2 + 0.5, h = yz_motor_distance + motor_casing, $fn = 6);
			translate([0, 0, -rod_size / 2 - 8]) rotate([0, 180, 0]) cylinder(r = m3_size * da6 * 2, h = yz_motor_distance + motor_casing, $fn = 6);
		}
	}
	translate([-yz_motor_distance / 2 + bearing_size / 2, 0, -bearing_size * sqrt(2) / 4]) rotate([90, -45, 0]) {
		%cylinder(r = rod_size * da8, h = 100, center = true, $fn = 8);
		for(side = [0, 1]) mirror([0, 0, side]) translate([0, 0, rod_size / 2 + 2]) {
			cylinder(r = bearing_size / 2, h = bearing_length, center = false, $fn = 80);
			cube([bearing_size / 2, bearing_size / 2, bearing_length]);
		}
	}
	translate([0, 0, end_height - rod_size * 1.5]) rotate([90, 180 / 8, 0]) cylinder(r = rod_size * da8, h = motor_casing + rod_size * 5, $fn = 8, center = true);
	%translate([0, 0, end_height - rod_size * 1.5]) rotate([90, 180 / 8, 0]) cylinder(r = rod_size * da8, h = 100, $fn = 8, center = true);
}
